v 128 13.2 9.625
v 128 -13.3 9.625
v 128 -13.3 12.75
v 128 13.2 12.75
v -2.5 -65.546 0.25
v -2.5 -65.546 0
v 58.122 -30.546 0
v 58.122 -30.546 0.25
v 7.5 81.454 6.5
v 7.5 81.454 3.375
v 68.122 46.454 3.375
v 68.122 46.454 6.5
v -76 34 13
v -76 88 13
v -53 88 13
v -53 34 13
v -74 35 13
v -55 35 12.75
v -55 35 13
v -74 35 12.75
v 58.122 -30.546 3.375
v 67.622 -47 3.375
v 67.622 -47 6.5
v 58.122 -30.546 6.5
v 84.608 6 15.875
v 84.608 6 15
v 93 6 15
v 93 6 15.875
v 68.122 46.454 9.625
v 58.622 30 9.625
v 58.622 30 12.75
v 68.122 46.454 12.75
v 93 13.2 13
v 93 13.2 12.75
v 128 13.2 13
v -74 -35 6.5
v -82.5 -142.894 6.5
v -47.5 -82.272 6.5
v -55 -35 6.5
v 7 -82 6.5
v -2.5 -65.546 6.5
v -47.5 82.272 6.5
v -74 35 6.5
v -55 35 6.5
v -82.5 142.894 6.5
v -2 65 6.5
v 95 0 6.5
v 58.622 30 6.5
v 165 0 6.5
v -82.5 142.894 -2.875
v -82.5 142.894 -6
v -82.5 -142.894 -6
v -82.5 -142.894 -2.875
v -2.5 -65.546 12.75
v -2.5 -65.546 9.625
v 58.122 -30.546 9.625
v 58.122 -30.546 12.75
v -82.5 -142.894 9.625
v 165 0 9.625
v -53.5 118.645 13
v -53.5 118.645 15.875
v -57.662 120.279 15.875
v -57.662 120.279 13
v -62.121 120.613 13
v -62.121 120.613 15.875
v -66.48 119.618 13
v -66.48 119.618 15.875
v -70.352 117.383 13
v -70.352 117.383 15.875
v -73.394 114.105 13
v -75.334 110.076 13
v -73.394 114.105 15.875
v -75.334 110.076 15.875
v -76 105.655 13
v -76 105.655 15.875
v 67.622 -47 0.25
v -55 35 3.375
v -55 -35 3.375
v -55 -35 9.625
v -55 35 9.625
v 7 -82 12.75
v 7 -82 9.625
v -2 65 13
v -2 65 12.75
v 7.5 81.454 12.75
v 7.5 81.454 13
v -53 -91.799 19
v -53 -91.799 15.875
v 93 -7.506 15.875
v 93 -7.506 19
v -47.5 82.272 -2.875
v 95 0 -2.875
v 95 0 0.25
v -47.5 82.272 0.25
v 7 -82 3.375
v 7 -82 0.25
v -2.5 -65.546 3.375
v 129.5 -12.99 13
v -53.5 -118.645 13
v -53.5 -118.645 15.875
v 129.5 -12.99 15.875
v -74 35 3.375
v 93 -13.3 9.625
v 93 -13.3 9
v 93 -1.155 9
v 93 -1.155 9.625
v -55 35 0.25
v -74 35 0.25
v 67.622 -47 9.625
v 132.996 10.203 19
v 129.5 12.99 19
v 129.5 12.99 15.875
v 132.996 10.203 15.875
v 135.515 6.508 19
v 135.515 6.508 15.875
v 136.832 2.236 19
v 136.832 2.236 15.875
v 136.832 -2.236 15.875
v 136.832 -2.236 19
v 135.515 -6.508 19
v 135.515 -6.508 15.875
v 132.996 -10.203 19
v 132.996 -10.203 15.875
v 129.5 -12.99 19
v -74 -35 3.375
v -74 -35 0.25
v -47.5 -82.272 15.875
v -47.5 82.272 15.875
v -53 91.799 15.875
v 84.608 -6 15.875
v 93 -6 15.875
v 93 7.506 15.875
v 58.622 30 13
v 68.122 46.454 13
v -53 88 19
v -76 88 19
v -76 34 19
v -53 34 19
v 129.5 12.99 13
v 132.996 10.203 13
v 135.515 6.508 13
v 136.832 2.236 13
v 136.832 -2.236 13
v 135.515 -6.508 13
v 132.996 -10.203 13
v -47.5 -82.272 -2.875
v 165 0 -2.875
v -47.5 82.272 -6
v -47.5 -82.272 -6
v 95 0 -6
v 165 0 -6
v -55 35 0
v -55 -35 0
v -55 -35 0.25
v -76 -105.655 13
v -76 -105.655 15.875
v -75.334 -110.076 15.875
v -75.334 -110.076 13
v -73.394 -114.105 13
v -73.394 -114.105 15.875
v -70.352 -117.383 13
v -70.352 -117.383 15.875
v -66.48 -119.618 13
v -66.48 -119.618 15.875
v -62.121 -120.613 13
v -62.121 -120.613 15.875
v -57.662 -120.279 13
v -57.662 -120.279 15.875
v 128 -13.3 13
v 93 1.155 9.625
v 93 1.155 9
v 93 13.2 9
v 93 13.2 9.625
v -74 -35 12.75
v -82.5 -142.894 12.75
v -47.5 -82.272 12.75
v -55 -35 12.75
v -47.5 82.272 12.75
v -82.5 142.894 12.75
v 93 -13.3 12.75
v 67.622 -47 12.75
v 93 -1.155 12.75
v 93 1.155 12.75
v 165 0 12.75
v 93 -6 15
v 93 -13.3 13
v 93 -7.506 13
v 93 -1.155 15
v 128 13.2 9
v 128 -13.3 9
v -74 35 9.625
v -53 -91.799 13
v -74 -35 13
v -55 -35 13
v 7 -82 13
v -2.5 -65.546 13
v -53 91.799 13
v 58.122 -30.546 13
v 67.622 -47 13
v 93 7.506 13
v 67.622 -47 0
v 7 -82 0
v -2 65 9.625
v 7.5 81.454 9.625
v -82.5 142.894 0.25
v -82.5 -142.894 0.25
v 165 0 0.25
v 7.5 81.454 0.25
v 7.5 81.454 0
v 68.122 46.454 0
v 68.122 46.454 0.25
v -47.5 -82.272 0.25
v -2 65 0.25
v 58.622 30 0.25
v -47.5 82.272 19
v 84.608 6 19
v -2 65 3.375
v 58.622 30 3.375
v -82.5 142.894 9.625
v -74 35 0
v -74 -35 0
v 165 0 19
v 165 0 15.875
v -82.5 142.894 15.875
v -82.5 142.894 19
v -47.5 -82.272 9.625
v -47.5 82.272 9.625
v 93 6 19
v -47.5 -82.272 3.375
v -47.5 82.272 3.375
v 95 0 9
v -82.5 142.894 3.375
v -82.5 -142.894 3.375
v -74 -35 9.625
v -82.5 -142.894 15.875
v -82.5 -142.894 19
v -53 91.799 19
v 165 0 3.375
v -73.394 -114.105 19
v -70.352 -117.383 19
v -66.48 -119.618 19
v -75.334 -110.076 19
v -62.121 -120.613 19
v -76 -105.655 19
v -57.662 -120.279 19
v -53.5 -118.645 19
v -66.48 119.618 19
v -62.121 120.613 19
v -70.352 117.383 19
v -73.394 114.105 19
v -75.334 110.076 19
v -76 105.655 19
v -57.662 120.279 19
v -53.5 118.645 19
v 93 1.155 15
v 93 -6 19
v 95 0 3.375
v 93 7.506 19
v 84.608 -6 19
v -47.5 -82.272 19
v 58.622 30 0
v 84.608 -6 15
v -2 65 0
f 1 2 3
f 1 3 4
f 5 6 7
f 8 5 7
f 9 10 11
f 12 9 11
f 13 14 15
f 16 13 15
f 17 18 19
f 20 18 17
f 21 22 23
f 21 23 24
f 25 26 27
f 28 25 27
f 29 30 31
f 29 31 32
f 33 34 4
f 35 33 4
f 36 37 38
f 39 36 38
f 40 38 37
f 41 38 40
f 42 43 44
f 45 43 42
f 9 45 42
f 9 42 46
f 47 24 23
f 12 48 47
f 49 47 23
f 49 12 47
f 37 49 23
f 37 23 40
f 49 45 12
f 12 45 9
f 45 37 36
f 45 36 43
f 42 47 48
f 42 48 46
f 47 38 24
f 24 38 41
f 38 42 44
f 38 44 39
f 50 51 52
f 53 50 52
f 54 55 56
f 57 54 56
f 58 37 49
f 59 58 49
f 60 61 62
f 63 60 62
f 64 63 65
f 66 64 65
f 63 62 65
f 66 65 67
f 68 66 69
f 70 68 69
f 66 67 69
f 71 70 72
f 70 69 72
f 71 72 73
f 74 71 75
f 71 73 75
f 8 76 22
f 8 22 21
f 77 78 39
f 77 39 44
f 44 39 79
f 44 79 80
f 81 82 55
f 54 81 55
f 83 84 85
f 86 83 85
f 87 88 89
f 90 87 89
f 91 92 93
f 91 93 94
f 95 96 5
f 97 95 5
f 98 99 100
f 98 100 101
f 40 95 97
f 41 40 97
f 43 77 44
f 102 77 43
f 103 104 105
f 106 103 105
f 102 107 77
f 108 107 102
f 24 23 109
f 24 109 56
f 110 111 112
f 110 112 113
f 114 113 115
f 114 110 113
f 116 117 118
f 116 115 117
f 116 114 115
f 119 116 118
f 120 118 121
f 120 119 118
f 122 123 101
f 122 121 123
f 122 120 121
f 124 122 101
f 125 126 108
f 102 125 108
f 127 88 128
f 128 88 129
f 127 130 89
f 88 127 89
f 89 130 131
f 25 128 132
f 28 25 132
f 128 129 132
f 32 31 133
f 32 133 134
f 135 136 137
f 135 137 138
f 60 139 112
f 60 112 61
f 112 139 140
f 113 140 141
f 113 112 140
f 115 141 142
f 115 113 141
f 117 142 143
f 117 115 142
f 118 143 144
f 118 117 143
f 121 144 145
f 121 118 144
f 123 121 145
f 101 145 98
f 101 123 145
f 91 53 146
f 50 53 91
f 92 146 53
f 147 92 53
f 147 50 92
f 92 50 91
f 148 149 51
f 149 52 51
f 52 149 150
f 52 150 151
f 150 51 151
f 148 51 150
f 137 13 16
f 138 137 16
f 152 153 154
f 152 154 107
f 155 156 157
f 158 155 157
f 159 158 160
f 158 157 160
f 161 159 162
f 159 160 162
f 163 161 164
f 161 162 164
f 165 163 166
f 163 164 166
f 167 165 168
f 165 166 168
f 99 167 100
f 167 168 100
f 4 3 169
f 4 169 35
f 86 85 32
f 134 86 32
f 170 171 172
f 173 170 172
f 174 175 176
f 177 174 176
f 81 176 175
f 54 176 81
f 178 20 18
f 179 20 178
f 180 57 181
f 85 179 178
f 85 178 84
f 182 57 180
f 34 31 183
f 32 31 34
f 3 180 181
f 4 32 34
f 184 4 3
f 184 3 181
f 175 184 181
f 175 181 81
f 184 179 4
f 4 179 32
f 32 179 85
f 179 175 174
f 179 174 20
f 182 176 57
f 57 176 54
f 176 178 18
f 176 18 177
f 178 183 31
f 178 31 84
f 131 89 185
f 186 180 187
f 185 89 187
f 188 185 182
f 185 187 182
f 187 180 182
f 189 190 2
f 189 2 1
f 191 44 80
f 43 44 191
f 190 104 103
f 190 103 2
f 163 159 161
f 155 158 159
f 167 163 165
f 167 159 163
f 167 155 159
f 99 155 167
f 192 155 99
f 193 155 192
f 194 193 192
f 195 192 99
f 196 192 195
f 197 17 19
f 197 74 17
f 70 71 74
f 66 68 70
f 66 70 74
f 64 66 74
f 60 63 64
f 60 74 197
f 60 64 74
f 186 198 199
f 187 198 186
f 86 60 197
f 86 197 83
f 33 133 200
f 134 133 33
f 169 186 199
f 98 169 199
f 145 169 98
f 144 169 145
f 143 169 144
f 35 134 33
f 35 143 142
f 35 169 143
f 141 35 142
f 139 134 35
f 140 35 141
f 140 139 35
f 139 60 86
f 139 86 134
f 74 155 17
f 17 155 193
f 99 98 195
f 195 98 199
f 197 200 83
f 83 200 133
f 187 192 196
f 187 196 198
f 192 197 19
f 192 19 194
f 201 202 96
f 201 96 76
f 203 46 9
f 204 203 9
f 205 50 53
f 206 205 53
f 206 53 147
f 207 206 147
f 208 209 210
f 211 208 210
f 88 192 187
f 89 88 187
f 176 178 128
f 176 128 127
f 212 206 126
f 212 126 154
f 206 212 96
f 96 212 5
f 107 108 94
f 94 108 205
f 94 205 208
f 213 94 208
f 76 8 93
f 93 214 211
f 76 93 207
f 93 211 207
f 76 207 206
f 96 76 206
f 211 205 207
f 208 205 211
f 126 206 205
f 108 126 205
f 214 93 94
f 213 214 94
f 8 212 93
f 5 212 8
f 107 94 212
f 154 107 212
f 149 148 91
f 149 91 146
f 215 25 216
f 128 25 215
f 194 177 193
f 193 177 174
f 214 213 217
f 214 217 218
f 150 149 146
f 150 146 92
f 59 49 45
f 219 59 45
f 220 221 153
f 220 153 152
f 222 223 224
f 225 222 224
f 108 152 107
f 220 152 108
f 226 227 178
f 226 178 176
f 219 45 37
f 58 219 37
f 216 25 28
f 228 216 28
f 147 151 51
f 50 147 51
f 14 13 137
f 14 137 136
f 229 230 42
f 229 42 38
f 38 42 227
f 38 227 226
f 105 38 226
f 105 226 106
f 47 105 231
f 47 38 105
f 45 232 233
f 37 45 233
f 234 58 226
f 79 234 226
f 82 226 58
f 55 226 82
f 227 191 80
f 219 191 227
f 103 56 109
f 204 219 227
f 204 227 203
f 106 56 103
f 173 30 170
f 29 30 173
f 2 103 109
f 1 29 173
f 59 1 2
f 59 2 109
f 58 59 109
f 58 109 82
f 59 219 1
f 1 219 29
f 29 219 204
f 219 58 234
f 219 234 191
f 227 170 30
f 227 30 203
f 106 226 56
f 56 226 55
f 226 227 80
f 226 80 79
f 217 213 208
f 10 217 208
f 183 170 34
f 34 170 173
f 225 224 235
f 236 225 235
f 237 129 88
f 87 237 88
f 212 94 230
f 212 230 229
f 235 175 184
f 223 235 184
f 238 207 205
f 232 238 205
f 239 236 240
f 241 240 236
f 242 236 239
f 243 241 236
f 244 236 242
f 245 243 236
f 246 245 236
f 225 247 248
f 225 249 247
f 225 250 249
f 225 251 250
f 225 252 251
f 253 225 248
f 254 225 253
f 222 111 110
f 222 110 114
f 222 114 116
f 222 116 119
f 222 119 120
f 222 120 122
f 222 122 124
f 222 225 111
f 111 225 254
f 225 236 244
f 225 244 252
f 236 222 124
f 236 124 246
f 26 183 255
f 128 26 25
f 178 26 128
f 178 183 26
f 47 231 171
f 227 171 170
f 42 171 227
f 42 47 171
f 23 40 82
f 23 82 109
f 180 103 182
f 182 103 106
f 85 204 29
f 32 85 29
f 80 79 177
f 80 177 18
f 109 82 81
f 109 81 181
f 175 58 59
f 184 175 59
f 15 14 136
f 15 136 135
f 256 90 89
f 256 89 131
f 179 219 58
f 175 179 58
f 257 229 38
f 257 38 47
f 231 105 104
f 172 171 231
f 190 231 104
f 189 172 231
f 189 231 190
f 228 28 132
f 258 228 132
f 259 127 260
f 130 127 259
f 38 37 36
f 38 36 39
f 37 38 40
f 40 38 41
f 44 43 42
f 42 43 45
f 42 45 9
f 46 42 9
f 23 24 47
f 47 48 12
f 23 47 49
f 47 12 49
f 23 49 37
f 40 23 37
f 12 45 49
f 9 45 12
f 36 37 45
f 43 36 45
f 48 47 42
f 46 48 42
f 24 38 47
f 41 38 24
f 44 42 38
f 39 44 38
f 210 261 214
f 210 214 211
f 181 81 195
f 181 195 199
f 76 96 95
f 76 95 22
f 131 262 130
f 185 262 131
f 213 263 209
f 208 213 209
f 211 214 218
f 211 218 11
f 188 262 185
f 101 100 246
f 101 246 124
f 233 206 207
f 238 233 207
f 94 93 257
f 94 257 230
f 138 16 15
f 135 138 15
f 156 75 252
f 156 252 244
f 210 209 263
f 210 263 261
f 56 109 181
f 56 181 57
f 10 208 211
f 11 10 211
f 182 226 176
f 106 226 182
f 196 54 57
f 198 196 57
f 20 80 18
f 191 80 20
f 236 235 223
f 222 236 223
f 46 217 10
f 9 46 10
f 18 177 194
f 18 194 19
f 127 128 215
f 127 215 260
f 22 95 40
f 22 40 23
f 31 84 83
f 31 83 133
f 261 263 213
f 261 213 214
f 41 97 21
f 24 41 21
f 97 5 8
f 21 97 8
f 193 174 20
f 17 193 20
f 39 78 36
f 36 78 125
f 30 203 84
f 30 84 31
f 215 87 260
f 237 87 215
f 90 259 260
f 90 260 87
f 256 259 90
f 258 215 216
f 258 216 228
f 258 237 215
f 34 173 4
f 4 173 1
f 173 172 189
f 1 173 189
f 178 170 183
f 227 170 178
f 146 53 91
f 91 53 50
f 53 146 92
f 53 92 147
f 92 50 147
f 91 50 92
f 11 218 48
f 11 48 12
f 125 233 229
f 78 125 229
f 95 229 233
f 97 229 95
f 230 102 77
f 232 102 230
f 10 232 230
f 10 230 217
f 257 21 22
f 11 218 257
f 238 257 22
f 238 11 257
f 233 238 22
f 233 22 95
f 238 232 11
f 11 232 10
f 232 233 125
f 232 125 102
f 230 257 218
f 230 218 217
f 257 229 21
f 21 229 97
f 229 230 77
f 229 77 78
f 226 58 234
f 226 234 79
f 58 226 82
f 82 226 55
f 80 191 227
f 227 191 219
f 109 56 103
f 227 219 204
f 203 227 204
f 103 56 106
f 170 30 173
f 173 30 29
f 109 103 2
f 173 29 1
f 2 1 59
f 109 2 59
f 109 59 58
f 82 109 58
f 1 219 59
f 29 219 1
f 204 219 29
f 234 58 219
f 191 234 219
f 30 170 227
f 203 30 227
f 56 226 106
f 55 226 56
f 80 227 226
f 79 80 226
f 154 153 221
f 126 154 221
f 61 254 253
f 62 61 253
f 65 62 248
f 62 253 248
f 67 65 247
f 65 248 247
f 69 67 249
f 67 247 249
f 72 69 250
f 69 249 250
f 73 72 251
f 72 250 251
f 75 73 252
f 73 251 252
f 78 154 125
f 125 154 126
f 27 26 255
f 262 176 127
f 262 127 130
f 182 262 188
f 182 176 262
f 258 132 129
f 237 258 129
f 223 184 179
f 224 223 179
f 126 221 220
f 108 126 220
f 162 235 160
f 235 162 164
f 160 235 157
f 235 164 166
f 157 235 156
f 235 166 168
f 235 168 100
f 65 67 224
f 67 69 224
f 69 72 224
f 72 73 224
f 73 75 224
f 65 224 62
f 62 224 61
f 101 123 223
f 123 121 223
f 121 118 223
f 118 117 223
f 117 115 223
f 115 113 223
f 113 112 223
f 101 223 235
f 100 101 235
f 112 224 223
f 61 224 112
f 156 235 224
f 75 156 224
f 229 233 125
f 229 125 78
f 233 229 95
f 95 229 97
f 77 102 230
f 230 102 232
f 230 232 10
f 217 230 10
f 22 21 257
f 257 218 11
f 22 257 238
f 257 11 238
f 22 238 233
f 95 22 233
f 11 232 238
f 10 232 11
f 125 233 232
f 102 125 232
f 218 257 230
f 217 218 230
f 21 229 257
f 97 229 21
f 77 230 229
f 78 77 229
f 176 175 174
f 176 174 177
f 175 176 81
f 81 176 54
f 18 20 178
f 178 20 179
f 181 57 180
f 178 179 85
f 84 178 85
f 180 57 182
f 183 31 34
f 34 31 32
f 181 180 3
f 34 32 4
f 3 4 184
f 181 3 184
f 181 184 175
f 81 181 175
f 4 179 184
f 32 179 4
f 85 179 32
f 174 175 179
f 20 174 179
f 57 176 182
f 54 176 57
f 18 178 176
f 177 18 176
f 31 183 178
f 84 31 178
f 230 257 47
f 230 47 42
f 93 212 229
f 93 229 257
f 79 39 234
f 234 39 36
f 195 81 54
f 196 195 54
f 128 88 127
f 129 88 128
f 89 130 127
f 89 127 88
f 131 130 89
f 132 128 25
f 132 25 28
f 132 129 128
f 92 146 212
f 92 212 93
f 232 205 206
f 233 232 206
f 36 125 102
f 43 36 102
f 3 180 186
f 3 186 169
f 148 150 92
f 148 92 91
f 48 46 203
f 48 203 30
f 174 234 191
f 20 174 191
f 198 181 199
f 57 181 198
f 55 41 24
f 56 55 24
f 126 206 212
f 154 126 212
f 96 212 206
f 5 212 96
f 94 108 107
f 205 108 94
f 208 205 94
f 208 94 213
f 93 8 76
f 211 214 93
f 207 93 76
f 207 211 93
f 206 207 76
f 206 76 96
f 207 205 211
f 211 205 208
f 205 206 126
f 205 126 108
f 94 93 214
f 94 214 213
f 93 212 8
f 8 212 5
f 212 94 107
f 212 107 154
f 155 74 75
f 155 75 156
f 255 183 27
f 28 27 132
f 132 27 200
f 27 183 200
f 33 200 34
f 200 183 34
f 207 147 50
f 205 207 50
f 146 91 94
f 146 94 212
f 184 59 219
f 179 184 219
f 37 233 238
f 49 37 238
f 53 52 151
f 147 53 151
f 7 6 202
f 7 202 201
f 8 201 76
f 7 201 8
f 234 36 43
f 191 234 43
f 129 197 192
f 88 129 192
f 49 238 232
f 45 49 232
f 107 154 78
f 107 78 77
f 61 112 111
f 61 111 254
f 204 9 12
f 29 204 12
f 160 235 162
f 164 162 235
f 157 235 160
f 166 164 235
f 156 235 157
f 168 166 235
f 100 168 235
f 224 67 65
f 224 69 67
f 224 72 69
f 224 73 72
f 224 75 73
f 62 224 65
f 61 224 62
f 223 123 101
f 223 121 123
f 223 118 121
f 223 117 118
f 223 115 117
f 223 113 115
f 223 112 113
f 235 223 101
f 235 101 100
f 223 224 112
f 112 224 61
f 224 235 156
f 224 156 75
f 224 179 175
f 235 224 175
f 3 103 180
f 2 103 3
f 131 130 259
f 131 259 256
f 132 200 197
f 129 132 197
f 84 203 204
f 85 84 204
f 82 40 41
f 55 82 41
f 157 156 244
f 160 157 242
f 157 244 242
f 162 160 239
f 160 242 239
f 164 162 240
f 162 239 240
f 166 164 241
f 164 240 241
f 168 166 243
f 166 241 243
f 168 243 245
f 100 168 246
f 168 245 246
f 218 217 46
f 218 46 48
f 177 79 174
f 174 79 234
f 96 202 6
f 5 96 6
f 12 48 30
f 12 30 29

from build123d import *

# Parameters (mm, degrees)
BOX005_W                = 23
BOX005_H                = 54
BOX005_DEPTH            = 6
BOX_BOTTOM_HALF_3_W     = 249.5
BOX_BOTTOM_HALF_3_H     = 287.788383
BOX_BOTTOM_HALF_3_DEPTH = 4.125
BOX_BOTTOM_HALF_1_W     = 249.5
BOX_BOTTOM_HALF_1_H     = 287.788383
BOX_BOTTOM_HALF_1_DEPTH = 7.25
BOX_BOTTOM_HALF_0_W     = 249.5
BOX_BOTTOM_HALF_0_H     = 287.788383
BOX_BOTTOM_HALF_0_DEPTH = 13.5
PRISM003_DEPTH          = 6
PRISM002_DEPTH          = 6
BOX004_W                = 10
BOX004_H                = 12
BOX004_DEPTH            = 4
BOX003_W                = 35
BOX003_H                = 26.5
BOX003_DEPTH            = 10
BOX002_W                = 70
BOX002_H                = 19
BOX002_DEPTH            = 19
BOX002_PLACEMENT_ANGLE  = 30
BOX001_W                = 70
BOX001_H                = 19
BOX001_DEPTH            = 19
BOX001_PLACEMENT_ANGLE  = 90
BOX_W                   = 70
BOX_H                   = 19
BOX_DEPTH               = 19
BOX_PLACEMENT_ANGLE     = 30
PRISM001_DEPTH          = 25
PRISM_DEPTH             = 25
FILLET_R                = 15
BOX_BOTTOM_HALF_4_W     = 249.5
BOX_BOTTOM_HALF_4_H     = 287.788383
BOX_BOTTOM_HALF_4_DEPTH = 4.125
BOX_BOTTOM_HALF_5_W     = 249.5
BOX_BOTTOM_HALF_5_H     = 287.788383
BOX_BOTTOM_HALF_5_DEPTH = 4.125
BOX_BOTTOM_HALF_2_W     = 249.5
BOX_BOTTOM_HALF_2_H     = 287.788383
BOX_BOTTOM_HALF_2_DEPTH = 7.25
BOX_BOTTOM_HALF_6_W     = 249.5
BOX_BOTTOM_HALF_6_H     = 287.788383
BOX_BOTTOM_HALF_6_DEPTH = 4.125


with BuildPart() as box005:
    # Box005 → Box005 (new body)
    with BuildSketch(Plane(origin=(-76, 34, 13), x_dir=(1, 0, 0), z_dir=(0, 0, 1))):
        with Locations((11.5, 27)):
            Rectangle(BOX005_W, BOX005_H)
    extrude(amount=BOX005_DEPTH)


with BuildPart() as box_bottom_half_3_body:
    # box_bottom_half_3 → box_bottom_half_3 (new body)
    with BuildSketch(Plane(origin=(-83.5, -143.894192, -7), x_dir=(1, 0, 0), z_dir=(0, 0, 1))):
        with Locations((124.75, 143.894192)):
            Rectangle(BOX_BOTTOM_HALF_3_W, BOX_BOTTOM_HALF_3_H)
    extrude(amount=BOX_BOTTOM_HALF_3_DEPTH)


with BuildPart() as box_bottom_half_1_body:
    # box_bottom_half_1 → box_bottom_half_1 (new body)
    with BuildSketch(Plane(origin=(-83.5, -143.894192, -7), x_dir=(1, 0, 0), z_dir=(0, 0, 1))):
        with Locations((124.75, 143.894192)):
            Rectangle(BOX_BOTTOM_HALF_1_W, BOX_BOTTOM_HALF_1_H)
    extrude(amount=BOX_BOTTOM_HALF_1_DEPTH)


with BuildPart() as box_bottom_half_0_body:
    # box_bottom_half_0 → box_bottom_half_0 (new body)
    with BuildSketch(Plane(origin=(-83.5, -143.894192, -7), x_dir=(1, 0, 0), z_dir=(0, 0, 1))):
        with Locations((124.75, 143.894192)):
            Rectangle(BOX_BOTTOM_HALF_0_W, BOX_BOTTOM_HALF_0_H)
    extrude(amount=BOX_BOTTOM_HALF_0_DEPTH)


with BuildPart() as prism003:
    # Prism003 → Prism003 (new body)
    with BuildSketch(Plane.XY.offset(13)):
        Polygon((106, 0), (-53, 91.798693), (-53, -91.798693), align=None)
    extrude(amount=PRISM003_DEPTH)


with BuildPart() as cut006:
    # Prism002 → Prism002 (new body)
    with BuildSketch(Plane.XY.offset(13)):
        Polygon((152, 0), (-76, 131.635861), (-76, -131.635861), align=None)
    extrude(amount=PRISM002_DEPTH)

    # Cut006: cut Prism003
    add(prism003.part, mode=Mode.SUBTRACT)


with BuildPart() as box004:
    # Box004 → Box004 (new body)
    with BuildSketch(Plane(origin=(84, -6, 15), x_dir=(1, 0, 0), z_dir=(0, 0, 1))):
        with Locations((5, 6)):
            Rectangle(BOX004_W, BOX004_H)
    extrude(amount=BOX004_DEPTH)


with BuildPart() as box003:
    # Box003 → Box003 (new body)
    with BuildSketch(Plane(origin=(93, -13.3, 9), x_dir=(1, 0, 0), z_dir=(0, 0, 1))):
        with Locations((17.5, 13.25)):
            Rectangle(BOX003_W, BOX003_H)
    extrude(amount=BOX003_DEPTH)


with BuildPart() as box002:
    # Box002 → Box002 (new body)
    with BuildSketch(Plane.XY):
        with Locations((35, 9.5)):
            Rectangle(BOX002_W, BOX002_H)
    extrude(amount=BOX002_DEPTH)


with BuildPart() as box002_1:
    # Box002 placement: moved
    add(box002.part.moved(Location((7, -82, 0))).rotate(Axis((7, -82, 0), (0, 0, 1)), BOX002_PLACEMENT_ANGLE))


with BuildPart() as box001:
    # Box001 → Box001 (new body)
    with BuildSketch(Plane.XY):
        with Locations((35, 9.5)):
            Rectangle(BOX001_W, BOX001_H)
    extrude(amount=BOX001_DEPTH)


with BuildPart() as box001_1:
    # Box001 placement: moved
    add(box001.part.moved(Location((-55, -35, 0))).rotate(Axis((-55, -35, 0), (0, 0, 1)), BOX001_PLACEMENT_ANGLE))


with BuildPart() as box:
    # Box → Box (new body)
    with BuildSketch(Plane.XY):
        with Locations((35, 9.5)):
            Rectangle(BOX_W, BOX_H)
    extrude(amount=BOX_DEPTH)


with BuildPart() as box_1:
    # Box placement: moved
    add(box.part.moved(Location((-2, 65, 0))).rotate(Axis((-2, 65, 0), (0, 0, -1)), BOX_PLACEMENT_ANGLE))


with BuildPart() as prism001:
    # Prism001 → Prism001 (new body)
    with BuildSketch(Plane.XY.offset(-6)):
        Polygon((95, 0), (-47.5, 82.272413), (-47.5, -82.272413), align=None)
    extrude(amount=PRISM001_DEPTH)


with BuildPart() as fillet_body:
    # Prism → Prism (new body)
    with BuildSketch(Plane.XY.offset(-6)):
        Polygon((165, 0), (-82.5, 142.894192), (-82.5, -142.894192), align=None)
    extrude(amount=PRISM_DEPTH)

    # Cut: cut Prism001
    add(prism001.part, mode=Mode.SUBTRACT)

    # Cut001: cut Box
    add(box_1.part, mode=Mode.SUBTRACT)

    # Cut002: cut Box001
    add(box001_1.part, mode=Mode.SUBTRACT)

    # Cut003: cut Box002
    add(box002_1.part, mode=Mode.SUBTRACT)

    # Cut004: cut Box003
    add(box003.part, mode=Mode.SUBTRACT)

    # Cut005: cut Box004
    add(box004.part, mode=Mode.SUBTRACT)

    # Cut007: cut Cut006
    add(cut006.part, mode=Mode.SUBTRACT)

    # Fillet
    fillet_edges = [fillet_body.edges().sort_by_distance(p)[0] for p in [
        (152, 0, 16),
        (-76, 131.635861, 16),
        (-76, -131.635861, 16),
    ]]
    fillet(fillet_edges, radius=FILLET_R)


with BuildPart() as bottom_half_0_body:
    # bottom_half_0 base: copy of Fillet body
    add(fillet_body.part)

    # bottom_half_0: intersect box_bottom_half_0 body
    add(box_bottom_half_0_body.part, mode=Mode.INTERSECT)


with BuildPart() as bottom_half_1_body:
    # bottom_half_1 base: copy of bottom_half_0 body
    add(bottom_half_0_body.part)

    # bottom_half_1: intersect box_bottom_half_1 body
    add(box_bottom_half_1_body.part, mode=Mode.INTERSECT)


with BuildPart() as bottom_half_3_body:
    # bottom_half_3 base: copy of bottom_half_1 body
    add(bottom_half_1_body.part)

    # bottom_half_3: intersect box_bottom_half_3 body
    add(box_bottom_half_3_body.part, mode=Mode.INTERSECT)


with BuildPart() as top_half_3_body:
    # top_half_3 base: copy of bottom_half_1 body
    add(bottom_half_1_body.part)

    # top_half_3: cut box_bottom_half_3 body
    add(box_bottom_half_3_body.part, mode=Mode.SUBTRACT)


with BuildPart() as box_bottom_half_4_body:
    # box_bottom_half_4 → box_bottom_half_4 (new body)
    with BuildSketch(Plane(origin=(-83.5, -143.894192, -0.75), x_dir=(1, 0, 0), z_dir=(0, 0, 1))):
        with Locations((124.75, 143.894192)):
            Rectangle(BOX_BOTTOM_HALF_4_W, BOX_BOTTOM_HALF_4_H)
    extrude(amount=BOX_BOTTOM_HALF_4_DEPTH)


with BuildPart() as top_half_1_body:
    # top_half_1 base: copy of bottom_half_0 body
    add(bottom_half_0_body.part)

    # top_half_1: cut box_bottom_half_1 body
    add(box_bottom_half_1_body.part, mode=Mode.SUBTRACT)


with BuildPart() as bottom_half_4_body:
    # bottom_half_4 base: copy of top_half_1 body
    add(top_half_1_body.part)

    # bottom_half_4: intersect box_bottom_half_4 body
    add(box_bottom_half_4_body.part, mode=Mode.INTERSECT)


with BuildPart() as top_half_4_body:
    # top_half_4 base: copy of top_half_1 body
    add(top_half_1_body.part)

    # top_half_4: cut box_bottom_half_4 body
    add(box_bottom_half_4_body.part, mode=Mode.SUBTRACT)


with BuildPart() as box_bottom_half_5_body:
    # box_bottom_half_5 → box_bottom_half_5 (new body)
    with BuildSketch(Plane(origin=(-83.5, -143.894192, 5.5), x_dir=(1, 0, 0), z_dir=(0, 0, 1))):
        with Locations((124.75, 143.894192)):
            Rectangle(BOX_BOTTOM_HALF_5_W, BOX_BOTTOM_HALF_5_H)
    extrude(amount=BOX_BOTTOM_HALF_5_DEPTH)


with BuildPart() as box_bottom_half_2_body:
    # box_bottom_half_2 → box_bottom_half_2 (new body)
    with BuildSketch(Plane(origin=(-83.5, -143.894192, 5.5), x_dir=(1, 0, 0), z_dir=(0, 0, 1))):
        with Locations((124.75, 143.894192)):
            Rectangle(BOX_BOTTOM_HALF_2_W, BOX_BOTTOM_HALF_2_H)
    extrude(amount=BOX_BOTTOM_HALF_2_DEPTH)


with BuildPart() as top_half_0_body:
    # top_half_0 base: copy of Fillet body
    add(fillet_body.part)

    # top_half_0: cut box_bottom_half_0 body
    add(box_bottom_half_0_body.part, mode=Mode.SUBTRACT)


with BuildPart() as bottom_half_2_body:
    # bottom_half_2 base: copy of top_half_0 body
    add(top_half_0_body.part)

    # bottom_half_2: intersect box_bottom_half_2 body
    add(box_bottom_half_2_body.part, mode=Mode.INTERSECT)


with BuildPart() as bottom_half_5_body:
    # bottom_half_5 base: copy of bottom_half_2 body
    add(bottom_half_2_body.part)

    # bottom_half_5: intersect box_bottom_half_5 body
    add(box_bottom_half_5_body.part, mode=Mode.INTERSECT)


with BuildPart() as top_half_5_body:
    # top_half_5 base: copy of bottom_half_2 body
    add(bottom_half_2_body.part)

    # top_half_5: cut box_bottom_half_5 body
    add(box_bottom_half_5_body.part, mode=Mode.SUBTRACT)


with BuildPart() as box_bottom_half_6_body:
    # box_bottom_half_6 → box_bottom_half_6 (new body)
    with BuildSketch(Plane(origin=(-83.5, -143.894192, 11.75), x_dir=(1, 0, 0), z_dir=(0, 0, 1))):
        with Locations((124.75, 143.894192)):
            Rectangle(BOX_BOTTOM_HALF_6_W, BOX_BOTTOM_HALF_6_H)
    extrude(amount=BOX_BOTTOM_HALF_6_DEPTH)


with BuildPart() as top_half_2_body:
    # top_half_2 base: copy of top_half_0 body
    add(top_half_0_body.part)

    # top_half_2: cut box_bottom_half_2 body
    add(box_bottom_half_2_body.part, mode=Mode.SUBTRACT)


with BuildPart() as bottom_half_6_body:
    # bottom_half_6 base: copy of top_half_2 body
    add(top_half_2_body.part)

    # bottom_half_6: intersect box_bottom_half_6 body
    add(box_bottom_half_6_body.part, mode=Mode.INTERSECT)


with BuildPart() as top_half_6_body:
    # top_half_6 base: copy of top_half_2 body
    add(top_half_2_body.part)

    # top_half_6: cut box_bottom_half_6 body
    add(box_bottom_half_6_body.part, mode=Mode.SUBTRACT)


solid = Compound([box005.part, bottom_half_3_body.part, top_half_3_body.part, bottom_half_4_body.part, top_half_4_body.part, bottom_half_5_body.part, top_half_5_body.part, bottom_half_6_body.part, top_half_6_body.part])
